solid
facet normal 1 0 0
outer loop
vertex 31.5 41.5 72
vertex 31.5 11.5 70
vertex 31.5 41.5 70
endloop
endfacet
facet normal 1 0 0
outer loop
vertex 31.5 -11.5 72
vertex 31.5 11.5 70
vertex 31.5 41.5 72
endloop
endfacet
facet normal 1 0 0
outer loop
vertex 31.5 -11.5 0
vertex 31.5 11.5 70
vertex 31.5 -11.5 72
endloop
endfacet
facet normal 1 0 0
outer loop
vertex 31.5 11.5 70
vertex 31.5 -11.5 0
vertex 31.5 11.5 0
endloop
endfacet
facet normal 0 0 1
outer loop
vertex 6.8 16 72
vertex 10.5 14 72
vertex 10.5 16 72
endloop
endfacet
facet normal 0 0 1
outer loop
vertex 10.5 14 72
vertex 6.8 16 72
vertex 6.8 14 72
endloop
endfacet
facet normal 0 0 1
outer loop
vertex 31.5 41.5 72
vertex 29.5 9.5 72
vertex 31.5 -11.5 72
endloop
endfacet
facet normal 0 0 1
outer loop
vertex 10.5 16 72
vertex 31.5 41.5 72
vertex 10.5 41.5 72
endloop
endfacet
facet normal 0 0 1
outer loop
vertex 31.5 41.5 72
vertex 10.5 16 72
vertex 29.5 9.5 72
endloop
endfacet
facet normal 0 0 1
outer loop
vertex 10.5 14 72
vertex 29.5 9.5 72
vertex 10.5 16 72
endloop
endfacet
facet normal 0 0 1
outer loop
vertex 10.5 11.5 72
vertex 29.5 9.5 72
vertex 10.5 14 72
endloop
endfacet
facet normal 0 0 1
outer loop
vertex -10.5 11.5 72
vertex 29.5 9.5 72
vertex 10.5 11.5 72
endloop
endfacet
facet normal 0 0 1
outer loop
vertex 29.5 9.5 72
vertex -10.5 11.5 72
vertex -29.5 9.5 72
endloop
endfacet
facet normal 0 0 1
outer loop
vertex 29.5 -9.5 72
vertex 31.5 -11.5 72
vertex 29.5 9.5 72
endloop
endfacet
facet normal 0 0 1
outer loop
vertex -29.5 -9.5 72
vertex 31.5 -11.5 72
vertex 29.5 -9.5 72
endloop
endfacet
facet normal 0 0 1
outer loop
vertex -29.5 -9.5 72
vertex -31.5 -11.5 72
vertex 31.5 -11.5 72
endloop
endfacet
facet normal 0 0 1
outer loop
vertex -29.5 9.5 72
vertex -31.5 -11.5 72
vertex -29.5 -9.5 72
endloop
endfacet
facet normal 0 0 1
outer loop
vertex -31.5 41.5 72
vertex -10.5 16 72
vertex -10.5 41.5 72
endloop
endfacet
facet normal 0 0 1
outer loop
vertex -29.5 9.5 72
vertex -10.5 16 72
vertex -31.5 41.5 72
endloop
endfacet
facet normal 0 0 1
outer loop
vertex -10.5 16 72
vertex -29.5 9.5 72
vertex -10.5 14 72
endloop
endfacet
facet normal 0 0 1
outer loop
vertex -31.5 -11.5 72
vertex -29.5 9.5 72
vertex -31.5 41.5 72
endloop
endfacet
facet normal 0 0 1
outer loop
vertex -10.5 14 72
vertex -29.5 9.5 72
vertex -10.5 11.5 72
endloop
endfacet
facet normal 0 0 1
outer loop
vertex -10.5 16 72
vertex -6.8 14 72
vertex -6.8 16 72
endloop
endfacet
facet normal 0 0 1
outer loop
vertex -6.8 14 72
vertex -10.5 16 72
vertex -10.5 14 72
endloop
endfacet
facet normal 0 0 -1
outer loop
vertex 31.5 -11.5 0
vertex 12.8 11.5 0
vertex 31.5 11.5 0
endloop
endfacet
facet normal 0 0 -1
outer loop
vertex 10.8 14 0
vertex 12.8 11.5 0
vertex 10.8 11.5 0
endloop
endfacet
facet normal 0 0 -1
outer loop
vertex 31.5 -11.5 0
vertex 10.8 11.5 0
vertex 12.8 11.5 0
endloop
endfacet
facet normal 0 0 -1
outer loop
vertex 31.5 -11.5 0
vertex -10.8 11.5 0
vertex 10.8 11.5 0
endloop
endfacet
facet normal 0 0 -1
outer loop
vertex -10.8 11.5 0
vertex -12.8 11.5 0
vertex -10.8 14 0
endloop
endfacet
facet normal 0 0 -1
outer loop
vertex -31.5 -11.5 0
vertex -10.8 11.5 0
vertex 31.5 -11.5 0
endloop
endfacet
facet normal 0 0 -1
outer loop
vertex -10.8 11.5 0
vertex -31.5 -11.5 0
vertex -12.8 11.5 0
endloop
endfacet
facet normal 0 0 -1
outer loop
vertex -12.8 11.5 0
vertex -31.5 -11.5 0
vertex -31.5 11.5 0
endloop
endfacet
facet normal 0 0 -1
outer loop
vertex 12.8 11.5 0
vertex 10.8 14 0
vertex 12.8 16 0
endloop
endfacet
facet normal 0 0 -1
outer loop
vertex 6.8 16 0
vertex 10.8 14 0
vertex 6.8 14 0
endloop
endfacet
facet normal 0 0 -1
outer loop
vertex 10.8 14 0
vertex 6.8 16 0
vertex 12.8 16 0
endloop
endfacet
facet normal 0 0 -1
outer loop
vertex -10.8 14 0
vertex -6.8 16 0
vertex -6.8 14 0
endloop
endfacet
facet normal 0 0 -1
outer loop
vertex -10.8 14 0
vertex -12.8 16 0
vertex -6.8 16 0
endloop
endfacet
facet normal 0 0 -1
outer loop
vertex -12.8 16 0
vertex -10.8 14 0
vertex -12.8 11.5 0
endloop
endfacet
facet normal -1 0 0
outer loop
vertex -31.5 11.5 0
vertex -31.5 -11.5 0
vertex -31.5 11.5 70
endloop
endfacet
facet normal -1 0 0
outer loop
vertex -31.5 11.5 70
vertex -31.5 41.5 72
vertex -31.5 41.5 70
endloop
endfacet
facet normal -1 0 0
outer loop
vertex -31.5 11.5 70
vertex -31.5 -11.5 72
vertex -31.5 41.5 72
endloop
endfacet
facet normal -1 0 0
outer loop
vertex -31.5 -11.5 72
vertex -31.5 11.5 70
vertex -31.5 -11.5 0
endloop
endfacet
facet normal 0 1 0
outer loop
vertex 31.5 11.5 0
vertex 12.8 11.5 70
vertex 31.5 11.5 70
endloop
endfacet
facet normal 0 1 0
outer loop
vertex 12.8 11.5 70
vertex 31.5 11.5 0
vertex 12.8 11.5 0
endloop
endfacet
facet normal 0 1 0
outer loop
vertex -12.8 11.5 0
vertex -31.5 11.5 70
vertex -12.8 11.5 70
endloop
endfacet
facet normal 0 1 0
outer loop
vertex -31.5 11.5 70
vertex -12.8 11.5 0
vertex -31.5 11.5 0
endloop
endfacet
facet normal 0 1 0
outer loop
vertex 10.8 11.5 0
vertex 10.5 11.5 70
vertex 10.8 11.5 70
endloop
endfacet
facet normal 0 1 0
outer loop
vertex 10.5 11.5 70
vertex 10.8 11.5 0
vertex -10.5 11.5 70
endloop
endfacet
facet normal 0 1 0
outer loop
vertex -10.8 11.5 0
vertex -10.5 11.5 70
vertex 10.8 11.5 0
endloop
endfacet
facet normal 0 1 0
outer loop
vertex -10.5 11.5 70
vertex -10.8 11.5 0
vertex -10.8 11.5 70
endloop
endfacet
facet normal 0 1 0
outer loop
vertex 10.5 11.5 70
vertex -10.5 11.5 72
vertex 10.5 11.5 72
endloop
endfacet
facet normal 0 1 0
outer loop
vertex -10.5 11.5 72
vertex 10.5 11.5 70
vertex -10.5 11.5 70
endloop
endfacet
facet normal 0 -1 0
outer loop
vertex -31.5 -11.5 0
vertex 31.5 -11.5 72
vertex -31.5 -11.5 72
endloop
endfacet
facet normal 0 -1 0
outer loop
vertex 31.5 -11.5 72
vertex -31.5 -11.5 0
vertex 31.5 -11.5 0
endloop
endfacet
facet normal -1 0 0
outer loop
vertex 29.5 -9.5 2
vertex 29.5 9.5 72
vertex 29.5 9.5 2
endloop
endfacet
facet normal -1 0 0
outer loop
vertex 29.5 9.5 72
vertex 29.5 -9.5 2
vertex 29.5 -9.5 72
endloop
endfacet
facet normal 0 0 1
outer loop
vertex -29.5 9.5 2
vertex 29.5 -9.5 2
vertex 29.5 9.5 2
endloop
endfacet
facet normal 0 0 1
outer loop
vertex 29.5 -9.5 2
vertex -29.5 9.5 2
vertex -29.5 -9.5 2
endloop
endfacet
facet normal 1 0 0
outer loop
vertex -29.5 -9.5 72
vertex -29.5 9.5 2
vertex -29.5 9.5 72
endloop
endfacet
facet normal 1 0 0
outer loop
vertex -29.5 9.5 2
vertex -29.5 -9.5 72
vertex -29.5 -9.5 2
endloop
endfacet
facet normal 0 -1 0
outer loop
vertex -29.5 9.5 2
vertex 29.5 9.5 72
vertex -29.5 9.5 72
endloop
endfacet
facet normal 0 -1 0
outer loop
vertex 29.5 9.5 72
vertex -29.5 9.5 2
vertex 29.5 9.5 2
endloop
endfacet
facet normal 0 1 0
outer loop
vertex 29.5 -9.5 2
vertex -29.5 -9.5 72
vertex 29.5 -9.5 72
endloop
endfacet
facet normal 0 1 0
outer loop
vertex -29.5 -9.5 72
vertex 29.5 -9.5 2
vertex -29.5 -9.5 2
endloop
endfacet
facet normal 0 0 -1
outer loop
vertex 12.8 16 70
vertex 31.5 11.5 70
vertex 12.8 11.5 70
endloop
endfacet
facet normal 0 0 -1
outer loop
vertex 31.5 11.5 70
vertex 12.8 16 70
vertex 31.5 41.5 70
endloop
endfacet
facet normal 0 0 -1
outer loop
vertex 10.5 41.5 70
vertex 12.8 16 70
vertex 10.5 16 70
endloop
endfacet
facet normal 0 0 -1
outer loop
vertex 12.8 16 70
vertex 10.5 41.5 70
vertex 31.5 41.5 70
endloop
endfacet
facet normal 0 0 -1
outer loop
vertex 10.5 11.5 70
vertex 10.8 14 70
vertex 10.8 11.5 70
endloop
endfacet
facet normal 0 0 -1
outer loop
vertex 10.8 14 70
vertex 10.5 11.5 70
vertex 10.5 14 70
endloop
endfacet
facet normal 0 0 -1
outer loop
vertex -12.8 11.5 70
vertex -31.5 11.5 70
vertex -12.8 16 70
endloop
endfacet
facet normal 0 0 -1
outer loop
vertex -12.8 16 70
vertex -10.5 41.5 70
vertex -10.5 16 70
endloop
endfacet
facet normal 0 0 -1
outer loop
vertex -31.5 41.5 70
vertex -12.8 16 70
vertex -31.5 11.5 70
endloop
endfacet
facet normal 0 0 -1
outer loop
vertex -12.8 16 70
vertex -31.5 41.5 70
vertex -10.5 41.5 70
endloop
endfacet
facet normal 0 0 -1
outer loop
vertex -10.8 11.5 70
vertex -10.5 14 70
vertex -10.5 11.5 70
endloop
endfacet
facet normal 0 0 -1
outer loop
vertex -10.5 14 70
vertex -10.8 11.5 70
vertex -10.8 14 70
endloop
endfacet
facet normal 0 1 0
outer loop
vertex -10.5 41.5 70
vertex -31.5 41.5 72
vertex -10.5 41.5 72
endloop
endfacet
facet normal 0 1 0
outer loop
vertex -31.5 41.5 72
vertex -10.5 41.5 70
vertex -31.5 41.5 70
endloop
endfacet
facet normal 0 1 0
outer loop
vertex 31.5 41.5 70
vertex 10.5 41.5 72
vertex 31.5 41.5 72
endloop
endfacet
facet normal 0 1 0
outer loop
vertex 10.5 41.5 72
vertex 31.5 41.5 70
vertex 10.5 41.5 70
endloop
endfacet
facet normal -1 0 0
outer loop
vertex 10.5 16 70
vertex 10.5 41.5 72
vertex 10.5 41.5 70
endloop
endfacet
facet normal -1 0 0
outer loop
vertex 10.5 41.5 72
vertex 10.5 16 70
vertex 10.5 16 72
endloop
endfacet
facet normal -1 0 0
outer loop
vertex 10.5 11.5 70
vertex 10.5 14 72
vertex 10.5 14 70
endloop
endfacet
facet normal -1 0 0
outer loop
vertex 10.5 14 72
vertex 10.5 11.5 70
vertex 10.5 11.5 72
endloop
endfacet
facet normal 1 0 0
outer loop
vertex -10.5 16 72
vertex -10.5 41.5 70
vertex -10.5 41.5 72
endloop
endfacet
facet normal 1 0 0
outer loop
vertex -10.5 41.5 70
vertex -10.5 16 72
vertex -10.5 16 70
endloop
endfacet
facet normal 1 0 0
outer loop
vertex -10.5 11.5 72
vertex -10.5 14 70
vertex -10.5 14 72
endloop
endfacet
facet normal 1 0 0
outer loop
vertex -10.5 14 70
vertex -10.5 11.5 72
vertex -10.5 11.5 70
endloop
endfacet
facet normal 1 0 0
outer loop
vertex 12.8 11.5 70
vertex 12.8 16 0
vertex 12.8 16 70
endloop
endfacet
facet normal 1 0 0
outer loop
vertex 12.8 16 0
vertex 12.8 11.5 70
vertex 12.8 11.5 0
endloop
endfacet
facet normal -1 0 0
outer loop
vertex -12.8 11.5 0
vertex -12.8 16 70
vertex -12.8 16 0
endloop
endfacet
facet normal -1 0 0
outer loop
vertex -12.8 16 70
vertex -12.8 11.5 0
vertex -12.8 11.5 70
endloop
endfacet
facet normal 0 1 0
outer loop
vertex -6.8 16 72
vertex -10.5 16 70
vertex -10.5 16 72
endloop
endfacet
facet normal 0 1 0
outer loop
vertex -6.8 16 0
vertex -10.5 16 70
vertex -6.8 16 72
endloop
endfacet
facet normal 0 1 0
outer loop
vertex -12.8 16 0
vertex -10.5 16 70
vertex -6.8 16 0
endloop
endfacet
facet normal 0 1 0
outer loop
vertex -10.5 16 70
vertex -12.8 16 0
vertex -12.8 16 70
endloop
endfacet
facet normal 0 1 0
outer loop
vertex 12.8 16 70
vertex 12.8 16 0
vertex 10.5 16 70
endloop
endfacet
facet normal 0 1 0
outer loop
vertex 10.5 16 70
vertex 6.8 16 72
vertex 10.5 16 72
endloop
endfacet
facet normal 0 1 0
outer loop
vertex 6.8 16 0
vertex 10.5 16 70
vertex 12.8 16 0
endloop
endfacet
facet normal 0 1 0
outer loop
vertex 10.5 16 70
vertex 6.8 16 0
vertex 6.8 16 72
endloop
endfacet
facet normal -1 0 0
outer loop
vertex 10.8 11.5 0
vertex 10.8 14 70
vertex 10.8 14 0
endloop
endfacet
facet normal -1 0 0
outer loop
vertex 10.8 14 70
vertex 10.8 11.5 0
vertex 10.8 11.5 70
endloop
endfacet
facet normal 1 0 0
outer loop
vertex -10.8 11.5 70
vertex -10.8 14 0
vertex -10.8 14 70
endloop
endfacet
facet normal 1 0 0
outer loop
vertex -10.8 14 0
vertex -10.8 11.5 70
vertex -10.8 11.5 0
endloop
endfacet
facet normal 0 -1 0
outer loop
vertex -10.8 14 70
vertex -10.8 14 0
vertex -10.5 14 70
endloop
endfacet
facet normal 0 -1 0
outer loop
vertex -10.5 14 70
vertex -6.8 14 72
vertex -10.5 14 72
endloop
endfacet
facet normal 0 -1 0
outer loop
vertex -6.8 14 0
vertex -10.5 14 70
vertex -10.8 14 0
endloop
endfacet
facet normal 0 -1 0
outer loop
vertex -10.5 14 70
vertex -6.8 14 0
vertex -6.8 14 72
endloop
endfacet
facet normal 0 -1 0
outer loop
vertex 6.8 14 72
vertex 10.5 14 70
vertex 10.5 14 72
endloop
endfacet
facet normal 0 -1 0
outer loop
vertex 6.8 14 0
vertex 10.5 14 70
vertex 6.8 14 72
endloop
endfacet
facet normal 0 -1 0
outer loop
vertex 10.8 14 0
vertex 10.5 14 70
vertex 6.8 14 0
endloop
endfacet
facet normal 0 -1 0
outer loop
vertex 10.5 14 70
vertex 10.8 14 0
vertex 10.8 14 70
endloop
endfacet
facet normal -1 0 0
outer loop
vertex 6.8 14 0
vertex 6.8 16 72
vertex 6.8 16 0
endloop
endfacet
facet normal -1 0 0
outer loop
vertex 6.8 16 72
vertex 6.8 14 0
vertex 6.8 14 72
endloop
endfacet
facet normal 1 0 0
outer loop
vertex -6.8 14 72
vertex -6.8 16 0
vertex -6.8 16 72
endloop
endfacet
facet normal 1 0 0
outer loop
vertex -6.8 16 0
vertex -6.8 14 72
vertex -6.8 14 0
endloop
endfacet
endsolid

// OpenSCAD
clamp_depth = 40;
pocket_depth = 70;
pocket_width = 59;
pocket_thickness = 19;

wall_thickness = 2;

pocket_outer_depth = pocket_depth + wall_thickness;
pocket_outer_width = pocket_width + wall_thickness * 2;
pocket_outer_thickness = pocket_thickness + wall_thickness * 2;

arm_length = 30;

clearance = 0.3;

rail_inner_width = pocket_outer_width / 3 + clearance * 2;
rail_outer_width = rail_inner_width + wall_thickness * 2;

rail_inner_thickness = wall_thickness + clearance * 2;
rail_outer_thickness = rail_inner_thickness + wall_thickness;

rail_flange_width = wall_thickness * 2;
rail_opening = rail_outer_width - rail_flange_width * 3;

module pocket () {
    difference () {
        translate ([-pocket_outer_width / 2, -pocket_outer_thickness / 2, 0])
        cube ([pocket_outer_width, pocket_outer_thickness,
                pocket_outer_depth]);

        translate ([-pocket_width / 2, -pocket_thickness / 2,  wall_thickness])
        cube ([pocket_width, pocket_thickness, pocket_depth + 0.1]);
    }
}

module upper_arms () {
    translate ([-pocket_outer_width / 2, 0, 0])
    difference () {
        cube ([pocket_outer_width, arm_length, wall_thickness]);

        translate ([pocket_outer_width / 3, -0.1, -0.1])
        cube ([pocket_outer_width / 3, arm_length + 0.2, wall_thickness + 0.2]);
    }
}

module rail () {
    difference () {
        // block forming the rail
        translate ([-rail_outer_width / 2, 0, 0])
        cube ([rail_outer_width, rail_outer_thickness, pocket_outer_depth]);

        // carve out the track
        translate ([-rail_inner_width / 2, -0.1, -0.1])
        cube ([rail_inner_width, rail_inner_thickness + 0.1,
                pocket_outer_depth + 0.2]);

        // carve out the opening
        translate ([-rail_opening / 2, 0, -0.1])
        cube ([rail_opening, rail_outer_thickness + 0.1,
                pocket_outer_depth + 0.2]);
    }
}

pocket ();

translate ([0, pocket_outer_thickness / 2, pocket_depth])
upper_arms ();

translate ([0, pocket_outer_thickness / 2 - 0.1, 0])
rail ();
